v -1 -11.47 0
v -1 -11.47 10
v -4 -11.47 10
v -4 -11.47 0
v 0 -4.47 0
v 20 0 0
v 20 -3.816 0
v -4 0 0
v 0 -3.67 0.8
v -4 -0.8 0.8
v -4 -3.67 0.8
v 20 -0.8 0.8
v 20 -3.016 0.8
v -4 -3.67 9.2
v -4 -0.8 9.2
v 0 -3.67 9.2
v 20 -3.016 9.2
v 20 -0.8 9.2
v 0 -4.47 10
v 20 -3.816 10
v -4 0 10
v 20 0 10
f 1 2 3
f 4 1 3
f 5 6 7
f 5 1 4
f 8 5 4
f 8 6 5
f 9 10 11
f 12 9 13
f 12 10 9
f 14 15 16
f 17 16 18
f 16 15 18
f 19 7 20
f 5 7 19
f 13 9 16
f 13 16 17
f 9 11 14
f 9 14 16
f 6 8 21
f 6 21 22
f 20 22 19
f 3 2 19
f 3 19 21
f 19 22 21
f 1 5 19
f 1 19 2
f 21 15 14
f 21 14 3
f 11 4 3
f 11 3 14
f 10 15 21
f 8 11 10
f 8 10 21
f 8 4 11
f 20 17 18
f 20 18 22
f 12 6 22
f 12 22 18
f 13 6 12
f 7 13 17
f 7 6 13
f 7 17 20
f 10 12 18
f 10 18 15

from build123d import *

# Parameters (mm, degrees)
PAD001_DEPTH = 8.4
PAD_DEPTH    = 10


with BuildPart() as pegcutoutpad:
    # Sketch001 → Pad001 (new body)
    with BuildSketch(Plane.XY.offset(0.8)):
        Polygon((20, -0.8), (-4, -0.8), (-4, -3.67), (0, -3.67), (20, -3.016154), align=None)
    extrude(amount=PAD001_DEPTH)


with BuildPart() as pegcut:
    # Sketch → Pad (new body)
    with BuildSketch(Plane.XY):
        Polygon((20, 0), (20, -3.816154), (0, -4.47), (-1, -11.47), (-4, -11.47), (-4, 0), align=None)
    extrude(amount=PAD_DEPTH)

    # Cut: cut PegCutOutPad
    add(pegcutoutpad.part, mode=Mode.SUBTRACT)


solid = pegcut.part
